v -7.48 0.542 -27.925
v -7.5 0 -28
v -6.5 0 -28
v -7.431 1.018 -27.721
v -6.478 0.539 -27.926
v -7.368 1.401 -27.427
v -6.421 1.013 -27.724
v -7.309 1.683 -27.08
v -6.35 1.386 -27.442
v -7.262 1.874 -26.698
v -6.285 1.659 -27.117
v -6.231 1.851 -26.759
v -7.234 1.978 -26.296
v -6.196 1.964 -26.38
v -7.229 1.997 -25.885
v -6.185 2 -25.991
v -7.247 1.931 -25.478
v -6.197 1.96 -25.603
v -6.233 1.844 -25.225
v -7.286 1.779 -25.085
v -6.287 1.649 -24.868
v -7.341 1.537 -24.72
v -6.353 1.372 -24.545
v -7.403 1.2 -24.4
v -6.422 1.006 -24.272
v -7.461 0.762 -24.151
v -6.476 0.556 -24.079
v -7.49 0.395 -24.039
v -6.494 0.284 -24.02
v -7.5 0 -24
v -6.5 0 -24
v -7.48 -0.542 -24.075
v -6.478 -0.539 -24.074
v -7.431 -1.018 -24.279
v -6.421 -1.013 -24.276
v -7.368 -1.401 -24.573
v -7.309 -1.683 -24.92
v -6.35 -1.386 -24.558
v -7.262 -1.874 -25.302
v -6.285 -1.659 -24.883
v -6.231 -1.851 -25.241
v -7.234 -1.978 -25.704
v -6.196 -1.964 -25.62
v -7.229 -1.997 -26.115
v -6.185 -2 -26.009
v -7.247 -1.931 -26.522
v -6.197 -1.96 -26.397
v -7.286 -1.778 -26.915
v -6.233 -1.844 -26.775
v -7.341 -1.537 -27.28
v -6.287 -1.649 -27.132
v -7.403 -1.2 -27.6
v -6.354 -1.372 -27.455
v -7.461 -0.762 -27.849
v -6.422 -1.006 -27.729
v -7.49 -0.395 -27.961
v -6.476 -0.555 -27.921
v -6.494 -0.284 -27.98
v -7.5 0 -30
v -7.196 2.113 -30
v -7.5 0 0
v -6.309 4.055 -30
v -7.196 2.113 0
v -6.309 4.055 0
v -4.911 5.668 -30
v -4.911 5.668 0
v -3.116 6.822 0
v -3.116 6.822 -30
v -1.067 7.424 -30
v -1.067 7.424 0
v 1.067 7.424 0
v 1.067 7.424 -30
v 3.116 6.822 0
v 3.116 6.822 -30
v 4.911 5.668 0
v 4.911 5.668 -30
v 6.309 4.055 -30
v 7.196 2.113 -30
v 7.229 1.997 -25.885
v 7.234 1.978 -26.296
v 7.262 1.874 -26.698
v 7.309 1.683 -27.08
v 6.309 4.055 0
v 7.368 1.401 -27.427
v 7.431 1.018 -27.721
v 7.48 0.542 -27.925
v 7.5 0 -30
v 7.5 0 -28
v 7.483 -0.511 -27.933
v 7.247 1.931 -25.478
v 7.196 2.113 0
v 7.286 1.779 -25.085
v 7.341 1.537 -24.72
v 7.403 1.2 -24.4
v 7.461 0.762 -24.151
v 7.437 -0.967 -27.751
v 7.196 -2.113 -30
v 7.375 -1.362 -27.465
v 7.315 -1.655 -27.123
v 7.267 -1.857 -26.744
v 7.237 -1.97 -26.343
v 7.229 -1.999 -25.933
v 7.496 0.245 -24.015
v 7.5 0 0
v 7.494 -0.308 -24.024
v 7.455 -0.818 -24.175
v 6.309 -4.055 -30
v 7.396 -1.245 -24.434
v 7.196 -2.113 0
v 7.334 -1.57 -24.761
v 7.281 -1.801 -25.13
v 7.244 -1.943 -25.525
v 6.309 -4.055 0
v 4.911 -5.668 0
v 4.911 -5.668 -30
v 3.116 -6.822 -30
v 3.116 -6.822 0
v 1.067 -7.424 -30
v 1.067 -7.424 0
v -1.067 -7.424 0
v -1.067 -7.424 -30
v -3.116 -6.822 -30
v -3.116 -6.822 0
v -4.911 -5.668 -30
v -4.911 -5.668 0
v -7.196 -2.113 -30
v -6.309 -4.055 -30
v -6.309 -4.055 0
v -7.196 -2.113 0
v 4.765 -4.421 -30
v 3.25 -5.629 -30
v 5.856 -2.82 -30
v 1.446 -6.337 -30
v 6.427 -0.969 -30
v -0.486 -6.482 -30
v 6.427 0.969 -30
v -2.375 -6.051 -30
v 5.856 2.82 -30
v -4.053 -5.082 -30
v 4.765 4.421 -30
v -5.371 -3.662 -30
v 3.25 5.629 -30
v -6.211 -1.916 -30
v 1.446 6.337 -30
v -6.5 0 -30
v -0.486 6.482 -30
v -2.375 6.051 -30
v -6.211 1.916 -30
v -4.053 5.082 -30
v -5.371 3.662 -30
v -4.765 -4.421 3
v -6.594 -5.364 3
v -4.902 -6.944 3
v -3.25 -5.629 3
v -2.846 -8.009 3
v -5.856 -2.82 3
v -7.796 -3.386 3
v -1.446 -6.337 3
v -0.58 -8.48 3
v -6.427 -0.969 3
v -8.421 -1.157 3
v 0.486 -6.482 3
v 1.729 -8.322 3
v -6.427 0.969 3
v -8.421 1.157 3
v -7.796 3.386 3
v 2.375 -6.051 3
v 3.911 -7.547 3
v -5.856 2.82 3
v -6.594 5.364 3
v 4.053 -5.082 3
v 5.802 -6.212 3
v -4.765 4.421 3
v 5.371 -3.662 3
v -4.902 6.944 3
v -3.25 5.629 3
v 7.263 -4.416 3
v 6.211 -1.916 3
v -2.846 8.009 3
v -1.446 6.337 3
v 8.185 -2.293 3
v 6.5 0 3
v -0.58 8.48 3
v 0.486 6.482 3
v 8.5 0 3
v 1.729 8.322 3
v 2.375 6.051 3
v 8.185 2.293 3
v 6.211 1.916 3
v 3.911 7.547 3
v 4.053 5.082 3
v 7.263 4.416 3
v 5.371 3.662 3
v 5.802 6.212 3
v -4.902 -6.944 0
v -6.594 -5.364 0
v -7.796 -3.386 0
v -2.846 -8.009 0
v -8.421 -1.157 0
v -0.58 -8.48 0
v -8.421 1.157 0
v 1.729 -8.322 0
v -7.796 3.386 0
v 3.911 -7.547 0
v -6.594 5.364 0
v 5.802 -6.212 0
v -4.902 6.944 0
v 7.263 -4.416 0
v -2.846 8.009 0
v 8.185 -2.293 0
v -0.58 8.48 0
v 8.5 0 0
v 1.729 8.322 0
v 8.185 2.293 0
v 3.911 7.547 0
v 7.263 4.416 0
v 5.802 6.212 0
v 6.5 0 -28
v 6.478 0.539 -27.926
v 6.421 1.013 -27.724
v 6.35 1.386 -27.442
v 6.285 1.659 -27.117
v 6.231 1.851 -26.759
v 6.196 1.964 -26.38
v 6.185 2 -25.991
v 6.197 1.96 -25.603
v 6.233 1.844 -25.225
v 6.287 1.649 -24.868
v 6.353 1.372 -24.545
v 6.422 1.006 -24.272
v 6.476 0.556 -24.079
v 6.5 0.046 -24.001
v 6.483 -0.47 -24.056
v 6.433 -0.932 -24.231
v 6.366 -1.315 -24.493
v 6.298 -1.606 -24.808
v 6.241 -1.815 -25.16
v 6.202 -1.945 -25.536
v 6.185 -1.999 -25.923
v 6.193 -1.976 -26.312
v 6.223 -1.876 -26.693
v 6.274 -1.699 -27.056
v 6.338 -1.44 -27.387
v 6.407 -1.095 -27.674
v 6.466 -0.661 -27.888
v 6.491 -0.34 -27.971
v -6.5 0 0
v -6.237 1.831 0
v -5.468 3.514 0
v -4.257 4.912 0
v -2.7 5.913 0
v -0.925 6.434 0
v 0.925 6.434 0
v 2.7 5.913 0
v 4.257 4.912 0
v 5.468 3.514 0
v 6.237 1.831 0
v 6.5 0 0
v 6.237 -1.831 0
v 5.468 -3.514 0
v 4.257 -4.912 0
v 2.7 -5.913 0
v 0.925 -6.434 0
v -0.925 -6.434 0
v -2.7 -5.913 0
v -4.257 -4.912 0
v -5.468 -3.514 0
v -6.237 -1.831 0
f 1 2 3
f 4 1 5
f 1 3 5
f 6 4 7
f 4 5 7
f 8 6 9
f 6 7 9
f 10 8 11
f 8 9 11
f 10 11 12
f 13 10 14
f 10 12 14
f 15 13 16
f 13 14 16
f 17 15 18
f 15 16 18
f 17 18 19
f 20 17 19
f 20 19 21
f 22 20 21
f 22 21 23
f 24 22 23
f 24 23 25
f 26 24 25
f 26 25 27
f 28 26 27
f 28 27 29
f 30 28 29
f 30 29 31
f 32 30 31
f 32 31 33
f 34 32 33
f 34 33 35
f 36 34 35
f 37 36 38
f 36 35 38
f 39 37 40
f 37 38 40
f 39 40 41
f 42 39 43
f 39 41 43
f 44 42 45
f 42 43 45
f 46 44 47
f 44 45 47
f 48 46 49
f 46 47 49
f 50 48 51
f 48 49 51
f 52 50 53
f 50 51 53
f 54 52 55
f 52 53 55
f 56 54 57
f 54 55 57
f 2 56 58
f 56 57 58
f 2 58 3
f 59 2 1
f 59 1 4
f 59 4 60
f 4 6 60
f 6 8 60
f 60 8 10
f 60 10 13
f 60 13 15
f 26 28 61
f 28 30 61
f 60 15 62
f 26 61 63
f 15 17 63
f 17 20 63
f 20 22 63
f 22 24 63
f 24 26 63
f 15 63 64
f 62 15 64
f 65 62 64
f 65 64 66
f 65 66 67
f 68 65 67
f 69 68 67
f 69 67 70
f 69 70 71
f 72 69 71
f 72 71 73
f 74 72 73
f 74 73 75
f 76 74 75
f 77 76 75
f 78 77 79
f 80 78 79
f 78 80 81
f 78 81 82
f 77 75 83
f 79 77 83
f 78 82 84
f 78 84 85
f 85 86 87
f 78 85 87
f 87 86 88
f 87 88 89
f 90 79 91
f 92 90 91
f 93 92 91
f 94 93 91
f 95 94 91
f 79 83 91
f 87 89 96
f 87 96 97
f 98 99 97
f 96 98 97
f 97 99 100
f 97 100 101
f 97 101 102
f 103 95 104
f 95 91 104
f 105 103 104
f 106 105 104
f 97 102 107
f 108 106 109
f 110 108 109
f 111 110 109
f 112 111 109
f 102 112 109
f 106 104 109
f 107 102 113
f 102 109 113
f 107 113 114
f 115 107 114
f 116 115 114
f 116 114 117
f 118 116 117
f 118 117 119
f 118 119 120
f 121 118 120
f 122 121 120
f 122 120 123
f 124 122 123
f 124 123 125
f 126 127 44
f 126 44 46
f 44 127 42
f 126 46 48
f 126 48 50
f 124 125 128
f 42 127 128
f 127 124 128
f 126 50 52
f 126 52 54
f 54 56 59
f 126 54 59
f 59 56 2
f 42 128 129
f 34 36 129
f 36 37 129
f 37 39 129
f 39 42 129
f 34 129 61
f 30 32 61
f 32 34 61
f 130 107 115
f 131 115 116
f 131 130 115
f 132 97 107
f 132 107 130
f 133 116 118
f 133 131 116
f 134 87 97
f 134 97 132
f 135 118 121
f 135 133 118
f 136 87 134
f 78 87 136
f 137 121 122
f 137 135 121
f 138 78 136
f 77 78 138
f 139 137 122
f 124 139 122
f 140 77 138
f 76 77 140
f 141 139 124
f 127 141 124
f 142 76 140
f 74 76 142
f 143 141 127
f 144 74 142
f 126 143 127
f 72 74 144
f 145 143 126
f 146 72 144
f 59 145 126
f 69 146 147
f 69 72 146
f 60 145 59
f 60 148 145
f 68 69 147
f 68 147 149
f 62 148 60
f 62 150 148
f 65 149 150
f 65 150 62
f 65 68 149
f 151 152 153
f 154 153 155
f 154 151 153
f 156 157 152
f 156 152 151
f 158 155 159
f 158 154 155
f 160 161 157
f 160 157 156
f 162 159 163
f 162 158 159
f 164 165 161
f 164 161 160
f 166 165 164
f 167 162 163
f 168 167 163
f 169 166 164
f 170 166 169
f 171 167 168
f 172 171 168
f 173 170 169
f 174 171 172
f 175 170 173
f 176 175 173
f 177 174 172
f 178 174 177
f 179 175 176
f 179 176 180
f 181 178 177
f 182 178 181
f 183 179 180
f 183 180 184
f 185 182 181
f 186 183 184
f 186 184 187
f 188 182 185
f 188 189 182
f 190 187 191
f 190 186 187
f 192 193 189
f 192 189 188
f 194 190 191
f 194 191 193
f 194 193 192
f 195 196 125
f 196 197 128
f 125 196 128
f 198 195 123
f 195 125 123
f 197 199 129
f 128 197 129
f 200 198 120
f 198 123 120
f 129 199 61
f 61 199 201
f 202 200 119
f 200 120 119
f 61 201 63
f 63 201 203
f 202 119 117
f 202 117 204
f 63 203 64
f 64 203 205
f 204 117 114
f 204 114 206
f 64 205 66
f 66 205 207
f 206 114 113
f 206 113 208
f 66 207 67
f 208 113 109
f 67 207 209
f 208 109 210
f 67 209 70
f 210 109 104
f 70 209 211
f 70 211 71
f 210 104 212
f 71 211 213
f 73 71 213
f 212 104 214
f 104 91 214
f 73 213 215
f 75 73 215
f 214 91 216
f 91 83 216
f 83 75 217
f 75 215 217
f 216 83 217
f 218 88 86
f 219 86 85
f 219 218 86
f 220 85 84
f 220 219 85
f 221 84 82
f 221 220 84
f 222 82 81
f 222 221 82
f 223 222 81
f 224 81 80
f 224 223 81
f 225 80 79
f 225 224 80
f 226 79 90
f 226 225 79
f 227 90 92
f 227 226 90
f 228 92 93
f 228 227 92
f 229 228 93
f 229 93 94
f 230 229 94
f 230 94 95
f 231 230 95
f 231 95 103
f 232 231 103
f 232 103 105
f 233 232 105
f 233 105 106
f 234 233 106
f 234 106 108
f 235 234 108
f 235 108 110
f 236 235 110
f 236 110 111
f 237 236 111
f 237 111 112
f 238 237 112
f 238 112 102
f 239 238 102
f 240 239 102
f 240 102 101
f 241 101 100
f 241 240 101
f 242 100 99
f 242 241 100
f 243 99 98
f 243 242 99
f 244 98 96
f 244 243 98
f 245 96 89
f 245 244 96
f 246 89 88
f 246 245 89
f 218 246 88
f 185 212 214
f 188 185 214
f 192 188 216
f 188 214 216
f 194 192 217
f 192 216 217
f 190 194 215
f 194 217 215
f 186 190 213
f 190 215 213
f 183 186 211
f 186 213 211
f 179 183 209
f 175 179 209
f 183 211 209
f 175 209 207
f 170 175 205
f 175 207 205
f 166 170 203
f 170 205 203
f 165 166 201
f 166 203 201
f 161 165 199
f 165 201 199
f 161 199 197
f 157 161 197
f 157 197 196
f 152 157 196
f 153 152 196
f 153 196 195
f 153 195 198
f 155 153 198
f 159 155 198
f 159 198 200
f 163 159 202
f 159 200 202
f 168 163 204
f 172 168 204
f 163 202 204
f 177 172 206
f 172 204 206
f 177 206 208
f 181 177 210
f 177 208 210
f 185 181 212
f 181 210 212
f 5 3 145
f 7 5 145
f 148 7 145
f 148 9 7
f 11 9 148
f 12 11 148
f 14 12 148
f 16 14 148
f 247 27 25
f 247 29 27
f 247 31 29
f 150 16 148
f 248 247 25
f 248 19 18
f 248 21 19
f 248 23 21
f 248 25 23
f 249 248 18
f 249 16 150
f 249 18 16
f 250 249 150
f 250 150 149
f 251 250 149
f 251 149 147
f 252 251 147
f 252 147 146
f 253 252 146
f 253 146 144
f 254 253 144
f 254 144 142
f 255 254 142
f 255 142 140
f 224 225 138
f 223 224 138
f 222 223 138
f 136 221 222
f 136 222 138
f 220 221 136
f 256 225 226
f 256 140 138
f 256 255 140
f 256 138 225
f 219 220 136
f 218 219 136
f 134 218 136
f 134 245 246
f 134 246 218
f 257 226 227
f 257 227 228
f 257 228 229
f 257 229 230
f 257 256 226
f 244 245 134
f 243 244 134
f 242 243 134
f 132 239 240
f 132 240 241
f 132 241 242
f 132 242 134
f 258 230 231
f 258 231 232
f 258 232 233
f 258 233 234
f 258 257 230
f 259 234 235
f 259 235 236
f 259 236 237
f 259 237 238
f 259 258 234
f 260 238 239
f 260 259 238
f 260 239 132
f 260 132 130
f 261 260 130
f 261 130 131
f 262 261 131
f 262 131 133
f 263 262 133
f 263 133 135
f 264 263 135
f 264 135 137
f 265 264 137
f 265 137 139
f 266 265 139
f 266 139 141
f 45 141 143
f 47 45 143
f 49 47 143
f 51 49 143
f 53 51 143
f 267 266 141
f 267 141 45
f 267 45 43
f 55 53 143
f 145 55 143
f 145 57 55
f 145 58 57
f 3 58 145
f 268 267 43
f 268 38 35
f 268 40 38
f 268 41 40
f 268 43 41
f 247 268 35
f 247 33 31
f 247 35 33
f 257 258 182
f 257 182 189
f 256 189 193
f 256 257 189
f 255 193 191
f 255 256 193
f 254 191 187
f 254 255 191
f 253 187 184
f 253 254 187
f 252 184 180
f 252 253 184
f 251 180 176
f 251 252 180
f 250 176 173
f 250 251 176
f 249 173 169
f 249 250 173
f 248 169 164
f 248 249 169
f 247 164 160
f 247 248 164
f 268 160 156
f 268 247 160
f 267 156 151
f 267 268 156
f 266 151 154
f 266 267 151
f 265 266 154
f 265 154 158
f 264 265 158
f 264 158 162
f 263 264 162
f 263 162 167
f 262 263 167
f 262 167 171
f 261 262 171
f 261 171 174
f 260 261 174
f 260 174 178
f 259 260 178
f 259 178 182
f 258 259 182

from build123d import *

# Parameters (mm, degrees)
ESBO_O1_R                  = 8.5
ESBO_O1_R_2                = 6.5
RESSALTO_EXTRUS_O1_DEPTH   = 3
ESBO_O3_R                  = 7.5
ESBO_O3_R_2                = 6.5
RESSALTO_EXTRUS_O3_DEPTH   = 30
ESBO_O4_R                  = 2
CORTE_EXTRUS_O1_DEPTH      = 9.5
CORTE_EXTRUS_O1_DEPTH_BACK = 9.5


with BuildPart() as part:
    # Esboço1 → Ressalto-extrusão1 (new body)
    with BuildSketch(Plane.XY):
        Circle(ESBO_O1_R)
        Circle(ESBO_O1_R_2, mode=Mode.SUBTRACT)
    extrude(amount=RESSALTO_EXTRUS_O1_DEPTH)

    # Esboço3 → Ressalto-extrusão3 (add)
    with BuildSketch(Plane(origin=(0, 0, 0), x_dir=(-1, 0, 0), z_dir=(0, 0, -1))):
        Circle(ESBO_O3_R)
        Circle(ESBO_O3_R_2, mode=Mode.SUBTRACT)
    extrude(amount=RESSALTO_EXTRUS_O3_DEPTH)

    # Esboço4 → Corte-extrusão1 (cut, two sides)
    with BuildSketch(Plane(origin=(0, 0, 0), x_dir=(0, 0, -1), z_dir=(1, 0, 0))) as corte_extrus_o1_sk:
        with Locations((26, 0)):
            Circle(ESBO_O4_R)
    extrude(amount=CORTE_EXTRUS_O1_DEPTH, mode=Mode.SUBTRACT)
    extrude(corte_extrus_o1_sk.sketch, amount=-CORTE_EXTRUS_O1_DEPTH_BACK, mode=Mode.SUBTRACT)


solid = part.part
